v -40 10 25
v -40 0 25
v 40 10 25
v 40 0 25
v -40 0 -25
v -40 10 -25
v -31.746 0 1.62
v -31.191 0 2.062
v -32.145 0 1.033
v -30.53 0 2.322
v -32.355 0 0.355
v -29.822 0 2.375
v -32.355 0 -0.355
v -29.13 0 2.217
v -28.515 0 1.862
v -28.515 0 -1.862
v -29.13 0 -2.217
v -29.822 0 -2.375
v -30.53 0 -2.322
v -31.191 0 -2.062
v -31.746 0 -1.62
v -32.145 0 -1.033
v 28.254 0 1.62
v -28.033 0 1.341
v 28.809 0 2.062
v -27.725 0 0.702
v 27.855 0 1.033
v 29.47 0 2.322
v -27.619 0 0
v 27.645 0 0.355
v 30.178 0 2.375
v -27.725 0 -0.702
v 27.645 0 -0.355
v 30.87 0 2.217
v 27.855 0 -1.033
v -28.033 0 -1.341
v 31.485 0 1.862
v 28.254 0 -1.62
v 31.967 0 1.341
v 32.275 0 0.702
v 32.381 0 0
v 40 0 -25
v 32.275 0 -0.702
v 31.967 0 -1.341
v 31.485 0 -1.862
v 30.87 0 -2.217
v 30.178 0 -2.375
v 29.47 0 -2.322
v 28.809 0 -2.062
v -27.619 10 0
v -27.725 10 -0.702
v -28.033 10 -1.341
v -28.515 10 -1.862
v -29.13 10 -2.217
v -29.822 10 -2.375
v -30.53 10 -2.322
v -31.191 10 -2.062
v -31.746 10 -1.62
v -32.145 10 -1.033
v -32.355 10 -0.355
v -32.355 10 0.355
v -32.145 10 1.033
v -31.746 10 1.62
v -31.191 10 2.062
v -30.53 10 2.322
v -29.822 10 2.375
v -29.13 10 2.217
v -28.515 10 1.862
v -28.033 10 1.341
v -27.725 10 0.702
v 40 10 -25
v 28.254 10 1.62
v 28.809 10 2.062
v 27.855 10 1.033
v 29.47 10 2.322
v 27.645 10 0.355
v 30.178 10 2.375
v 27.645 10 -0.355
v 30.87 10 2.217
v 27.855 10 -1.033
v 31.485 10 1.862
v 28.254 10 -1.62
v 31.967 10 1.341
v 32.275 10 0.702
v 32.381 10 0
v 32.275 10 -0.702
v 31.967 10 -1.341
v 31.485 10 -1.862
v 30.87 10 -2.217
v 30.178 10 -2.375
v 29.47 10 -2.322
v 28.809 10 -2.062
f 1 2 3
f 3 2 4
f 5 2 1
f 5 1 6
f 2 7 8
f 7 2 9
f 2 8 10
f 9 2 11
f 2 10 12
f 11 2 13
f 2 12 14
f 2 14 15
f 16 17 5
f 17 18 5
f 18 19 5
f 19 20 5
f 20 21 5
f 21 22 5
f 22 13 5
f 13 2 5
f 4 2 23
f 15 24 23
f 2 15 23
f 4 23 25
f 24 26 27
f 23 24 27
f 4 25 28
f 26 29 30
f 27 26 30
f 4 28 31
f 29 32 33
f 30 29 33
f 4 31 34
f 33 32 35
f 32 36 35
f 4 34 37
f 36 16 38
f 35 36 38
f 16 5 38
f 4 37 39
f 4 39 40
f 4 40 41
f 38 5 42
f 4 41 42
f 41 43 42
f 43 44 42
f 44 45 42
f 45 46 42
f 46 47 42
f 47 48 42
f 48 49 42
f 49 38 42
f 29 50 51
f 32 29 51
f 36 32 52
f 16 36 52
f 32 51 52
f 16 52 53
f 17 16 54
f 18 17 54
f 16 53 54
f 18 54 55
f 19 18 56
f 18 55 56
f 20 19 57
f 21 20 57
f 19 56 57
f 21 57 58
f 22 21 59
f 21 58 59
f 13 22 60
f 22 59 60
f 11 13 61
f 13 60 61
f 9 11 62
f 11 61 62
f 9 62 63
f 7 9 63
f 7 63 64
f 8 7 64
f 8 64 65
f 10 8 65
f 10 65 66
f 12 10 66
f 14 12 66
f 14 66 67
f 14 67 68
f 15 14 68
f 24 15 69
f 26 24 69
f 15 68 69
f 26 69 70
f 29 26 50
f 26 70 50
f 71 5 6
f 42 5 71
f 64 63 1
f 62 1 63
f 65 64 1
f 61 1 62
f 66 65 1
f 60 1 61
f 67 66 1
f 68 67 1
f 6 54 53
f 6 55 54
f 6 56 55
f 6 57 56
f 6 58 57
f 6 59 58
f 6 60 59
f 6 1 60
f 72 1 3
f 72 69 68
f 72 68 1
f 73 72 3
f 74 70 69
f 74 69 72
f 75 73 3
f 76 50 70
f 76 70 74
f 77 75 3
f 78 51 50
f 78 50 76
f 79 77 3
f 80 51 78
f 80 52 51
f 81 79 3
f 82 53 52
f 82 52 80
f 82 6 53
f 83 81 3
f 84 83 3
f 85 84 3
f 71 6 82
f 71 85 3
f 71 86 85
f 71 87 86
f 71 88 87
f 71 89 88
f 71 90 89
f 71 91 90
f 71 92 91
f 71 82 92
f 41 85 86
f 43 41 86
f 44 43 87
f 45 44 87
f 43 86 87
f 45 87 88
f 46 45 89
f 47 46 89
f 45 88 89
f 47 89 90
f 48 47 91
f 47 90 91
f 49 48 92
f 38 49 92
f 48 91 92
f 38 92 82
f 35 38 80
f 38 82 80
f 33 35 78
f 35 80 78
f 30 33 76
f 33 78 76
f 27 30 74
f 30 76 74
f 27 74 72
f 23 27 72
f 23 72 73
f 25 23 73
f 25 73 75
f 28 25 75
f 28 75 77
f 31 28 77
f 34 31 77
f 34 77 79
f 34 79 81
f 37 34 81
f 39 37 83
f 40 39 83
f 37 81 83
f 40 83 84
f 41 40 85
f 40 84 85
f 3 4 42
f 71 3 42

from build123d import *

# Parameters (mm, degrees)
SKETCH1_W           = 80
SKETCH1_H           = 50
BOSS_EXTRUDE1_DEPTH = 10
SKETCH2_R           = 2.38125
CUT_EXTRUDE1_DEPTH  = 10


with BuildPart() as part:
    # Sketch1 → Boss-Extrude1 (new body)
    with BuildSketch(Plane(origin=(0, 0, 0), x_dir=(1, 0, 0), z_dir=(0, 1, 0))):
        Rectangle(SKETCH1_W, SKETCH1_H)
    extrude(amount=BOSS_EXTRUDE1_DEPTH)

    # Sketch2 → Cut-Extrude1 (cut)
    with BuildSketch(Plane(origin=(0, 10, 0), x_dir=(1, 0, 0), z_dir=(0, 1, 0))):
        with Locations((-30, 0)):
            Circle(SKETCH2_R)
        with Locations((30, 0)):
            Circle(SKETCH2_R)
    extrude(amount=-CUT_EXTRUDE1_DEPTH, mode=Mode.SUBTRACT)


solid = part.part
